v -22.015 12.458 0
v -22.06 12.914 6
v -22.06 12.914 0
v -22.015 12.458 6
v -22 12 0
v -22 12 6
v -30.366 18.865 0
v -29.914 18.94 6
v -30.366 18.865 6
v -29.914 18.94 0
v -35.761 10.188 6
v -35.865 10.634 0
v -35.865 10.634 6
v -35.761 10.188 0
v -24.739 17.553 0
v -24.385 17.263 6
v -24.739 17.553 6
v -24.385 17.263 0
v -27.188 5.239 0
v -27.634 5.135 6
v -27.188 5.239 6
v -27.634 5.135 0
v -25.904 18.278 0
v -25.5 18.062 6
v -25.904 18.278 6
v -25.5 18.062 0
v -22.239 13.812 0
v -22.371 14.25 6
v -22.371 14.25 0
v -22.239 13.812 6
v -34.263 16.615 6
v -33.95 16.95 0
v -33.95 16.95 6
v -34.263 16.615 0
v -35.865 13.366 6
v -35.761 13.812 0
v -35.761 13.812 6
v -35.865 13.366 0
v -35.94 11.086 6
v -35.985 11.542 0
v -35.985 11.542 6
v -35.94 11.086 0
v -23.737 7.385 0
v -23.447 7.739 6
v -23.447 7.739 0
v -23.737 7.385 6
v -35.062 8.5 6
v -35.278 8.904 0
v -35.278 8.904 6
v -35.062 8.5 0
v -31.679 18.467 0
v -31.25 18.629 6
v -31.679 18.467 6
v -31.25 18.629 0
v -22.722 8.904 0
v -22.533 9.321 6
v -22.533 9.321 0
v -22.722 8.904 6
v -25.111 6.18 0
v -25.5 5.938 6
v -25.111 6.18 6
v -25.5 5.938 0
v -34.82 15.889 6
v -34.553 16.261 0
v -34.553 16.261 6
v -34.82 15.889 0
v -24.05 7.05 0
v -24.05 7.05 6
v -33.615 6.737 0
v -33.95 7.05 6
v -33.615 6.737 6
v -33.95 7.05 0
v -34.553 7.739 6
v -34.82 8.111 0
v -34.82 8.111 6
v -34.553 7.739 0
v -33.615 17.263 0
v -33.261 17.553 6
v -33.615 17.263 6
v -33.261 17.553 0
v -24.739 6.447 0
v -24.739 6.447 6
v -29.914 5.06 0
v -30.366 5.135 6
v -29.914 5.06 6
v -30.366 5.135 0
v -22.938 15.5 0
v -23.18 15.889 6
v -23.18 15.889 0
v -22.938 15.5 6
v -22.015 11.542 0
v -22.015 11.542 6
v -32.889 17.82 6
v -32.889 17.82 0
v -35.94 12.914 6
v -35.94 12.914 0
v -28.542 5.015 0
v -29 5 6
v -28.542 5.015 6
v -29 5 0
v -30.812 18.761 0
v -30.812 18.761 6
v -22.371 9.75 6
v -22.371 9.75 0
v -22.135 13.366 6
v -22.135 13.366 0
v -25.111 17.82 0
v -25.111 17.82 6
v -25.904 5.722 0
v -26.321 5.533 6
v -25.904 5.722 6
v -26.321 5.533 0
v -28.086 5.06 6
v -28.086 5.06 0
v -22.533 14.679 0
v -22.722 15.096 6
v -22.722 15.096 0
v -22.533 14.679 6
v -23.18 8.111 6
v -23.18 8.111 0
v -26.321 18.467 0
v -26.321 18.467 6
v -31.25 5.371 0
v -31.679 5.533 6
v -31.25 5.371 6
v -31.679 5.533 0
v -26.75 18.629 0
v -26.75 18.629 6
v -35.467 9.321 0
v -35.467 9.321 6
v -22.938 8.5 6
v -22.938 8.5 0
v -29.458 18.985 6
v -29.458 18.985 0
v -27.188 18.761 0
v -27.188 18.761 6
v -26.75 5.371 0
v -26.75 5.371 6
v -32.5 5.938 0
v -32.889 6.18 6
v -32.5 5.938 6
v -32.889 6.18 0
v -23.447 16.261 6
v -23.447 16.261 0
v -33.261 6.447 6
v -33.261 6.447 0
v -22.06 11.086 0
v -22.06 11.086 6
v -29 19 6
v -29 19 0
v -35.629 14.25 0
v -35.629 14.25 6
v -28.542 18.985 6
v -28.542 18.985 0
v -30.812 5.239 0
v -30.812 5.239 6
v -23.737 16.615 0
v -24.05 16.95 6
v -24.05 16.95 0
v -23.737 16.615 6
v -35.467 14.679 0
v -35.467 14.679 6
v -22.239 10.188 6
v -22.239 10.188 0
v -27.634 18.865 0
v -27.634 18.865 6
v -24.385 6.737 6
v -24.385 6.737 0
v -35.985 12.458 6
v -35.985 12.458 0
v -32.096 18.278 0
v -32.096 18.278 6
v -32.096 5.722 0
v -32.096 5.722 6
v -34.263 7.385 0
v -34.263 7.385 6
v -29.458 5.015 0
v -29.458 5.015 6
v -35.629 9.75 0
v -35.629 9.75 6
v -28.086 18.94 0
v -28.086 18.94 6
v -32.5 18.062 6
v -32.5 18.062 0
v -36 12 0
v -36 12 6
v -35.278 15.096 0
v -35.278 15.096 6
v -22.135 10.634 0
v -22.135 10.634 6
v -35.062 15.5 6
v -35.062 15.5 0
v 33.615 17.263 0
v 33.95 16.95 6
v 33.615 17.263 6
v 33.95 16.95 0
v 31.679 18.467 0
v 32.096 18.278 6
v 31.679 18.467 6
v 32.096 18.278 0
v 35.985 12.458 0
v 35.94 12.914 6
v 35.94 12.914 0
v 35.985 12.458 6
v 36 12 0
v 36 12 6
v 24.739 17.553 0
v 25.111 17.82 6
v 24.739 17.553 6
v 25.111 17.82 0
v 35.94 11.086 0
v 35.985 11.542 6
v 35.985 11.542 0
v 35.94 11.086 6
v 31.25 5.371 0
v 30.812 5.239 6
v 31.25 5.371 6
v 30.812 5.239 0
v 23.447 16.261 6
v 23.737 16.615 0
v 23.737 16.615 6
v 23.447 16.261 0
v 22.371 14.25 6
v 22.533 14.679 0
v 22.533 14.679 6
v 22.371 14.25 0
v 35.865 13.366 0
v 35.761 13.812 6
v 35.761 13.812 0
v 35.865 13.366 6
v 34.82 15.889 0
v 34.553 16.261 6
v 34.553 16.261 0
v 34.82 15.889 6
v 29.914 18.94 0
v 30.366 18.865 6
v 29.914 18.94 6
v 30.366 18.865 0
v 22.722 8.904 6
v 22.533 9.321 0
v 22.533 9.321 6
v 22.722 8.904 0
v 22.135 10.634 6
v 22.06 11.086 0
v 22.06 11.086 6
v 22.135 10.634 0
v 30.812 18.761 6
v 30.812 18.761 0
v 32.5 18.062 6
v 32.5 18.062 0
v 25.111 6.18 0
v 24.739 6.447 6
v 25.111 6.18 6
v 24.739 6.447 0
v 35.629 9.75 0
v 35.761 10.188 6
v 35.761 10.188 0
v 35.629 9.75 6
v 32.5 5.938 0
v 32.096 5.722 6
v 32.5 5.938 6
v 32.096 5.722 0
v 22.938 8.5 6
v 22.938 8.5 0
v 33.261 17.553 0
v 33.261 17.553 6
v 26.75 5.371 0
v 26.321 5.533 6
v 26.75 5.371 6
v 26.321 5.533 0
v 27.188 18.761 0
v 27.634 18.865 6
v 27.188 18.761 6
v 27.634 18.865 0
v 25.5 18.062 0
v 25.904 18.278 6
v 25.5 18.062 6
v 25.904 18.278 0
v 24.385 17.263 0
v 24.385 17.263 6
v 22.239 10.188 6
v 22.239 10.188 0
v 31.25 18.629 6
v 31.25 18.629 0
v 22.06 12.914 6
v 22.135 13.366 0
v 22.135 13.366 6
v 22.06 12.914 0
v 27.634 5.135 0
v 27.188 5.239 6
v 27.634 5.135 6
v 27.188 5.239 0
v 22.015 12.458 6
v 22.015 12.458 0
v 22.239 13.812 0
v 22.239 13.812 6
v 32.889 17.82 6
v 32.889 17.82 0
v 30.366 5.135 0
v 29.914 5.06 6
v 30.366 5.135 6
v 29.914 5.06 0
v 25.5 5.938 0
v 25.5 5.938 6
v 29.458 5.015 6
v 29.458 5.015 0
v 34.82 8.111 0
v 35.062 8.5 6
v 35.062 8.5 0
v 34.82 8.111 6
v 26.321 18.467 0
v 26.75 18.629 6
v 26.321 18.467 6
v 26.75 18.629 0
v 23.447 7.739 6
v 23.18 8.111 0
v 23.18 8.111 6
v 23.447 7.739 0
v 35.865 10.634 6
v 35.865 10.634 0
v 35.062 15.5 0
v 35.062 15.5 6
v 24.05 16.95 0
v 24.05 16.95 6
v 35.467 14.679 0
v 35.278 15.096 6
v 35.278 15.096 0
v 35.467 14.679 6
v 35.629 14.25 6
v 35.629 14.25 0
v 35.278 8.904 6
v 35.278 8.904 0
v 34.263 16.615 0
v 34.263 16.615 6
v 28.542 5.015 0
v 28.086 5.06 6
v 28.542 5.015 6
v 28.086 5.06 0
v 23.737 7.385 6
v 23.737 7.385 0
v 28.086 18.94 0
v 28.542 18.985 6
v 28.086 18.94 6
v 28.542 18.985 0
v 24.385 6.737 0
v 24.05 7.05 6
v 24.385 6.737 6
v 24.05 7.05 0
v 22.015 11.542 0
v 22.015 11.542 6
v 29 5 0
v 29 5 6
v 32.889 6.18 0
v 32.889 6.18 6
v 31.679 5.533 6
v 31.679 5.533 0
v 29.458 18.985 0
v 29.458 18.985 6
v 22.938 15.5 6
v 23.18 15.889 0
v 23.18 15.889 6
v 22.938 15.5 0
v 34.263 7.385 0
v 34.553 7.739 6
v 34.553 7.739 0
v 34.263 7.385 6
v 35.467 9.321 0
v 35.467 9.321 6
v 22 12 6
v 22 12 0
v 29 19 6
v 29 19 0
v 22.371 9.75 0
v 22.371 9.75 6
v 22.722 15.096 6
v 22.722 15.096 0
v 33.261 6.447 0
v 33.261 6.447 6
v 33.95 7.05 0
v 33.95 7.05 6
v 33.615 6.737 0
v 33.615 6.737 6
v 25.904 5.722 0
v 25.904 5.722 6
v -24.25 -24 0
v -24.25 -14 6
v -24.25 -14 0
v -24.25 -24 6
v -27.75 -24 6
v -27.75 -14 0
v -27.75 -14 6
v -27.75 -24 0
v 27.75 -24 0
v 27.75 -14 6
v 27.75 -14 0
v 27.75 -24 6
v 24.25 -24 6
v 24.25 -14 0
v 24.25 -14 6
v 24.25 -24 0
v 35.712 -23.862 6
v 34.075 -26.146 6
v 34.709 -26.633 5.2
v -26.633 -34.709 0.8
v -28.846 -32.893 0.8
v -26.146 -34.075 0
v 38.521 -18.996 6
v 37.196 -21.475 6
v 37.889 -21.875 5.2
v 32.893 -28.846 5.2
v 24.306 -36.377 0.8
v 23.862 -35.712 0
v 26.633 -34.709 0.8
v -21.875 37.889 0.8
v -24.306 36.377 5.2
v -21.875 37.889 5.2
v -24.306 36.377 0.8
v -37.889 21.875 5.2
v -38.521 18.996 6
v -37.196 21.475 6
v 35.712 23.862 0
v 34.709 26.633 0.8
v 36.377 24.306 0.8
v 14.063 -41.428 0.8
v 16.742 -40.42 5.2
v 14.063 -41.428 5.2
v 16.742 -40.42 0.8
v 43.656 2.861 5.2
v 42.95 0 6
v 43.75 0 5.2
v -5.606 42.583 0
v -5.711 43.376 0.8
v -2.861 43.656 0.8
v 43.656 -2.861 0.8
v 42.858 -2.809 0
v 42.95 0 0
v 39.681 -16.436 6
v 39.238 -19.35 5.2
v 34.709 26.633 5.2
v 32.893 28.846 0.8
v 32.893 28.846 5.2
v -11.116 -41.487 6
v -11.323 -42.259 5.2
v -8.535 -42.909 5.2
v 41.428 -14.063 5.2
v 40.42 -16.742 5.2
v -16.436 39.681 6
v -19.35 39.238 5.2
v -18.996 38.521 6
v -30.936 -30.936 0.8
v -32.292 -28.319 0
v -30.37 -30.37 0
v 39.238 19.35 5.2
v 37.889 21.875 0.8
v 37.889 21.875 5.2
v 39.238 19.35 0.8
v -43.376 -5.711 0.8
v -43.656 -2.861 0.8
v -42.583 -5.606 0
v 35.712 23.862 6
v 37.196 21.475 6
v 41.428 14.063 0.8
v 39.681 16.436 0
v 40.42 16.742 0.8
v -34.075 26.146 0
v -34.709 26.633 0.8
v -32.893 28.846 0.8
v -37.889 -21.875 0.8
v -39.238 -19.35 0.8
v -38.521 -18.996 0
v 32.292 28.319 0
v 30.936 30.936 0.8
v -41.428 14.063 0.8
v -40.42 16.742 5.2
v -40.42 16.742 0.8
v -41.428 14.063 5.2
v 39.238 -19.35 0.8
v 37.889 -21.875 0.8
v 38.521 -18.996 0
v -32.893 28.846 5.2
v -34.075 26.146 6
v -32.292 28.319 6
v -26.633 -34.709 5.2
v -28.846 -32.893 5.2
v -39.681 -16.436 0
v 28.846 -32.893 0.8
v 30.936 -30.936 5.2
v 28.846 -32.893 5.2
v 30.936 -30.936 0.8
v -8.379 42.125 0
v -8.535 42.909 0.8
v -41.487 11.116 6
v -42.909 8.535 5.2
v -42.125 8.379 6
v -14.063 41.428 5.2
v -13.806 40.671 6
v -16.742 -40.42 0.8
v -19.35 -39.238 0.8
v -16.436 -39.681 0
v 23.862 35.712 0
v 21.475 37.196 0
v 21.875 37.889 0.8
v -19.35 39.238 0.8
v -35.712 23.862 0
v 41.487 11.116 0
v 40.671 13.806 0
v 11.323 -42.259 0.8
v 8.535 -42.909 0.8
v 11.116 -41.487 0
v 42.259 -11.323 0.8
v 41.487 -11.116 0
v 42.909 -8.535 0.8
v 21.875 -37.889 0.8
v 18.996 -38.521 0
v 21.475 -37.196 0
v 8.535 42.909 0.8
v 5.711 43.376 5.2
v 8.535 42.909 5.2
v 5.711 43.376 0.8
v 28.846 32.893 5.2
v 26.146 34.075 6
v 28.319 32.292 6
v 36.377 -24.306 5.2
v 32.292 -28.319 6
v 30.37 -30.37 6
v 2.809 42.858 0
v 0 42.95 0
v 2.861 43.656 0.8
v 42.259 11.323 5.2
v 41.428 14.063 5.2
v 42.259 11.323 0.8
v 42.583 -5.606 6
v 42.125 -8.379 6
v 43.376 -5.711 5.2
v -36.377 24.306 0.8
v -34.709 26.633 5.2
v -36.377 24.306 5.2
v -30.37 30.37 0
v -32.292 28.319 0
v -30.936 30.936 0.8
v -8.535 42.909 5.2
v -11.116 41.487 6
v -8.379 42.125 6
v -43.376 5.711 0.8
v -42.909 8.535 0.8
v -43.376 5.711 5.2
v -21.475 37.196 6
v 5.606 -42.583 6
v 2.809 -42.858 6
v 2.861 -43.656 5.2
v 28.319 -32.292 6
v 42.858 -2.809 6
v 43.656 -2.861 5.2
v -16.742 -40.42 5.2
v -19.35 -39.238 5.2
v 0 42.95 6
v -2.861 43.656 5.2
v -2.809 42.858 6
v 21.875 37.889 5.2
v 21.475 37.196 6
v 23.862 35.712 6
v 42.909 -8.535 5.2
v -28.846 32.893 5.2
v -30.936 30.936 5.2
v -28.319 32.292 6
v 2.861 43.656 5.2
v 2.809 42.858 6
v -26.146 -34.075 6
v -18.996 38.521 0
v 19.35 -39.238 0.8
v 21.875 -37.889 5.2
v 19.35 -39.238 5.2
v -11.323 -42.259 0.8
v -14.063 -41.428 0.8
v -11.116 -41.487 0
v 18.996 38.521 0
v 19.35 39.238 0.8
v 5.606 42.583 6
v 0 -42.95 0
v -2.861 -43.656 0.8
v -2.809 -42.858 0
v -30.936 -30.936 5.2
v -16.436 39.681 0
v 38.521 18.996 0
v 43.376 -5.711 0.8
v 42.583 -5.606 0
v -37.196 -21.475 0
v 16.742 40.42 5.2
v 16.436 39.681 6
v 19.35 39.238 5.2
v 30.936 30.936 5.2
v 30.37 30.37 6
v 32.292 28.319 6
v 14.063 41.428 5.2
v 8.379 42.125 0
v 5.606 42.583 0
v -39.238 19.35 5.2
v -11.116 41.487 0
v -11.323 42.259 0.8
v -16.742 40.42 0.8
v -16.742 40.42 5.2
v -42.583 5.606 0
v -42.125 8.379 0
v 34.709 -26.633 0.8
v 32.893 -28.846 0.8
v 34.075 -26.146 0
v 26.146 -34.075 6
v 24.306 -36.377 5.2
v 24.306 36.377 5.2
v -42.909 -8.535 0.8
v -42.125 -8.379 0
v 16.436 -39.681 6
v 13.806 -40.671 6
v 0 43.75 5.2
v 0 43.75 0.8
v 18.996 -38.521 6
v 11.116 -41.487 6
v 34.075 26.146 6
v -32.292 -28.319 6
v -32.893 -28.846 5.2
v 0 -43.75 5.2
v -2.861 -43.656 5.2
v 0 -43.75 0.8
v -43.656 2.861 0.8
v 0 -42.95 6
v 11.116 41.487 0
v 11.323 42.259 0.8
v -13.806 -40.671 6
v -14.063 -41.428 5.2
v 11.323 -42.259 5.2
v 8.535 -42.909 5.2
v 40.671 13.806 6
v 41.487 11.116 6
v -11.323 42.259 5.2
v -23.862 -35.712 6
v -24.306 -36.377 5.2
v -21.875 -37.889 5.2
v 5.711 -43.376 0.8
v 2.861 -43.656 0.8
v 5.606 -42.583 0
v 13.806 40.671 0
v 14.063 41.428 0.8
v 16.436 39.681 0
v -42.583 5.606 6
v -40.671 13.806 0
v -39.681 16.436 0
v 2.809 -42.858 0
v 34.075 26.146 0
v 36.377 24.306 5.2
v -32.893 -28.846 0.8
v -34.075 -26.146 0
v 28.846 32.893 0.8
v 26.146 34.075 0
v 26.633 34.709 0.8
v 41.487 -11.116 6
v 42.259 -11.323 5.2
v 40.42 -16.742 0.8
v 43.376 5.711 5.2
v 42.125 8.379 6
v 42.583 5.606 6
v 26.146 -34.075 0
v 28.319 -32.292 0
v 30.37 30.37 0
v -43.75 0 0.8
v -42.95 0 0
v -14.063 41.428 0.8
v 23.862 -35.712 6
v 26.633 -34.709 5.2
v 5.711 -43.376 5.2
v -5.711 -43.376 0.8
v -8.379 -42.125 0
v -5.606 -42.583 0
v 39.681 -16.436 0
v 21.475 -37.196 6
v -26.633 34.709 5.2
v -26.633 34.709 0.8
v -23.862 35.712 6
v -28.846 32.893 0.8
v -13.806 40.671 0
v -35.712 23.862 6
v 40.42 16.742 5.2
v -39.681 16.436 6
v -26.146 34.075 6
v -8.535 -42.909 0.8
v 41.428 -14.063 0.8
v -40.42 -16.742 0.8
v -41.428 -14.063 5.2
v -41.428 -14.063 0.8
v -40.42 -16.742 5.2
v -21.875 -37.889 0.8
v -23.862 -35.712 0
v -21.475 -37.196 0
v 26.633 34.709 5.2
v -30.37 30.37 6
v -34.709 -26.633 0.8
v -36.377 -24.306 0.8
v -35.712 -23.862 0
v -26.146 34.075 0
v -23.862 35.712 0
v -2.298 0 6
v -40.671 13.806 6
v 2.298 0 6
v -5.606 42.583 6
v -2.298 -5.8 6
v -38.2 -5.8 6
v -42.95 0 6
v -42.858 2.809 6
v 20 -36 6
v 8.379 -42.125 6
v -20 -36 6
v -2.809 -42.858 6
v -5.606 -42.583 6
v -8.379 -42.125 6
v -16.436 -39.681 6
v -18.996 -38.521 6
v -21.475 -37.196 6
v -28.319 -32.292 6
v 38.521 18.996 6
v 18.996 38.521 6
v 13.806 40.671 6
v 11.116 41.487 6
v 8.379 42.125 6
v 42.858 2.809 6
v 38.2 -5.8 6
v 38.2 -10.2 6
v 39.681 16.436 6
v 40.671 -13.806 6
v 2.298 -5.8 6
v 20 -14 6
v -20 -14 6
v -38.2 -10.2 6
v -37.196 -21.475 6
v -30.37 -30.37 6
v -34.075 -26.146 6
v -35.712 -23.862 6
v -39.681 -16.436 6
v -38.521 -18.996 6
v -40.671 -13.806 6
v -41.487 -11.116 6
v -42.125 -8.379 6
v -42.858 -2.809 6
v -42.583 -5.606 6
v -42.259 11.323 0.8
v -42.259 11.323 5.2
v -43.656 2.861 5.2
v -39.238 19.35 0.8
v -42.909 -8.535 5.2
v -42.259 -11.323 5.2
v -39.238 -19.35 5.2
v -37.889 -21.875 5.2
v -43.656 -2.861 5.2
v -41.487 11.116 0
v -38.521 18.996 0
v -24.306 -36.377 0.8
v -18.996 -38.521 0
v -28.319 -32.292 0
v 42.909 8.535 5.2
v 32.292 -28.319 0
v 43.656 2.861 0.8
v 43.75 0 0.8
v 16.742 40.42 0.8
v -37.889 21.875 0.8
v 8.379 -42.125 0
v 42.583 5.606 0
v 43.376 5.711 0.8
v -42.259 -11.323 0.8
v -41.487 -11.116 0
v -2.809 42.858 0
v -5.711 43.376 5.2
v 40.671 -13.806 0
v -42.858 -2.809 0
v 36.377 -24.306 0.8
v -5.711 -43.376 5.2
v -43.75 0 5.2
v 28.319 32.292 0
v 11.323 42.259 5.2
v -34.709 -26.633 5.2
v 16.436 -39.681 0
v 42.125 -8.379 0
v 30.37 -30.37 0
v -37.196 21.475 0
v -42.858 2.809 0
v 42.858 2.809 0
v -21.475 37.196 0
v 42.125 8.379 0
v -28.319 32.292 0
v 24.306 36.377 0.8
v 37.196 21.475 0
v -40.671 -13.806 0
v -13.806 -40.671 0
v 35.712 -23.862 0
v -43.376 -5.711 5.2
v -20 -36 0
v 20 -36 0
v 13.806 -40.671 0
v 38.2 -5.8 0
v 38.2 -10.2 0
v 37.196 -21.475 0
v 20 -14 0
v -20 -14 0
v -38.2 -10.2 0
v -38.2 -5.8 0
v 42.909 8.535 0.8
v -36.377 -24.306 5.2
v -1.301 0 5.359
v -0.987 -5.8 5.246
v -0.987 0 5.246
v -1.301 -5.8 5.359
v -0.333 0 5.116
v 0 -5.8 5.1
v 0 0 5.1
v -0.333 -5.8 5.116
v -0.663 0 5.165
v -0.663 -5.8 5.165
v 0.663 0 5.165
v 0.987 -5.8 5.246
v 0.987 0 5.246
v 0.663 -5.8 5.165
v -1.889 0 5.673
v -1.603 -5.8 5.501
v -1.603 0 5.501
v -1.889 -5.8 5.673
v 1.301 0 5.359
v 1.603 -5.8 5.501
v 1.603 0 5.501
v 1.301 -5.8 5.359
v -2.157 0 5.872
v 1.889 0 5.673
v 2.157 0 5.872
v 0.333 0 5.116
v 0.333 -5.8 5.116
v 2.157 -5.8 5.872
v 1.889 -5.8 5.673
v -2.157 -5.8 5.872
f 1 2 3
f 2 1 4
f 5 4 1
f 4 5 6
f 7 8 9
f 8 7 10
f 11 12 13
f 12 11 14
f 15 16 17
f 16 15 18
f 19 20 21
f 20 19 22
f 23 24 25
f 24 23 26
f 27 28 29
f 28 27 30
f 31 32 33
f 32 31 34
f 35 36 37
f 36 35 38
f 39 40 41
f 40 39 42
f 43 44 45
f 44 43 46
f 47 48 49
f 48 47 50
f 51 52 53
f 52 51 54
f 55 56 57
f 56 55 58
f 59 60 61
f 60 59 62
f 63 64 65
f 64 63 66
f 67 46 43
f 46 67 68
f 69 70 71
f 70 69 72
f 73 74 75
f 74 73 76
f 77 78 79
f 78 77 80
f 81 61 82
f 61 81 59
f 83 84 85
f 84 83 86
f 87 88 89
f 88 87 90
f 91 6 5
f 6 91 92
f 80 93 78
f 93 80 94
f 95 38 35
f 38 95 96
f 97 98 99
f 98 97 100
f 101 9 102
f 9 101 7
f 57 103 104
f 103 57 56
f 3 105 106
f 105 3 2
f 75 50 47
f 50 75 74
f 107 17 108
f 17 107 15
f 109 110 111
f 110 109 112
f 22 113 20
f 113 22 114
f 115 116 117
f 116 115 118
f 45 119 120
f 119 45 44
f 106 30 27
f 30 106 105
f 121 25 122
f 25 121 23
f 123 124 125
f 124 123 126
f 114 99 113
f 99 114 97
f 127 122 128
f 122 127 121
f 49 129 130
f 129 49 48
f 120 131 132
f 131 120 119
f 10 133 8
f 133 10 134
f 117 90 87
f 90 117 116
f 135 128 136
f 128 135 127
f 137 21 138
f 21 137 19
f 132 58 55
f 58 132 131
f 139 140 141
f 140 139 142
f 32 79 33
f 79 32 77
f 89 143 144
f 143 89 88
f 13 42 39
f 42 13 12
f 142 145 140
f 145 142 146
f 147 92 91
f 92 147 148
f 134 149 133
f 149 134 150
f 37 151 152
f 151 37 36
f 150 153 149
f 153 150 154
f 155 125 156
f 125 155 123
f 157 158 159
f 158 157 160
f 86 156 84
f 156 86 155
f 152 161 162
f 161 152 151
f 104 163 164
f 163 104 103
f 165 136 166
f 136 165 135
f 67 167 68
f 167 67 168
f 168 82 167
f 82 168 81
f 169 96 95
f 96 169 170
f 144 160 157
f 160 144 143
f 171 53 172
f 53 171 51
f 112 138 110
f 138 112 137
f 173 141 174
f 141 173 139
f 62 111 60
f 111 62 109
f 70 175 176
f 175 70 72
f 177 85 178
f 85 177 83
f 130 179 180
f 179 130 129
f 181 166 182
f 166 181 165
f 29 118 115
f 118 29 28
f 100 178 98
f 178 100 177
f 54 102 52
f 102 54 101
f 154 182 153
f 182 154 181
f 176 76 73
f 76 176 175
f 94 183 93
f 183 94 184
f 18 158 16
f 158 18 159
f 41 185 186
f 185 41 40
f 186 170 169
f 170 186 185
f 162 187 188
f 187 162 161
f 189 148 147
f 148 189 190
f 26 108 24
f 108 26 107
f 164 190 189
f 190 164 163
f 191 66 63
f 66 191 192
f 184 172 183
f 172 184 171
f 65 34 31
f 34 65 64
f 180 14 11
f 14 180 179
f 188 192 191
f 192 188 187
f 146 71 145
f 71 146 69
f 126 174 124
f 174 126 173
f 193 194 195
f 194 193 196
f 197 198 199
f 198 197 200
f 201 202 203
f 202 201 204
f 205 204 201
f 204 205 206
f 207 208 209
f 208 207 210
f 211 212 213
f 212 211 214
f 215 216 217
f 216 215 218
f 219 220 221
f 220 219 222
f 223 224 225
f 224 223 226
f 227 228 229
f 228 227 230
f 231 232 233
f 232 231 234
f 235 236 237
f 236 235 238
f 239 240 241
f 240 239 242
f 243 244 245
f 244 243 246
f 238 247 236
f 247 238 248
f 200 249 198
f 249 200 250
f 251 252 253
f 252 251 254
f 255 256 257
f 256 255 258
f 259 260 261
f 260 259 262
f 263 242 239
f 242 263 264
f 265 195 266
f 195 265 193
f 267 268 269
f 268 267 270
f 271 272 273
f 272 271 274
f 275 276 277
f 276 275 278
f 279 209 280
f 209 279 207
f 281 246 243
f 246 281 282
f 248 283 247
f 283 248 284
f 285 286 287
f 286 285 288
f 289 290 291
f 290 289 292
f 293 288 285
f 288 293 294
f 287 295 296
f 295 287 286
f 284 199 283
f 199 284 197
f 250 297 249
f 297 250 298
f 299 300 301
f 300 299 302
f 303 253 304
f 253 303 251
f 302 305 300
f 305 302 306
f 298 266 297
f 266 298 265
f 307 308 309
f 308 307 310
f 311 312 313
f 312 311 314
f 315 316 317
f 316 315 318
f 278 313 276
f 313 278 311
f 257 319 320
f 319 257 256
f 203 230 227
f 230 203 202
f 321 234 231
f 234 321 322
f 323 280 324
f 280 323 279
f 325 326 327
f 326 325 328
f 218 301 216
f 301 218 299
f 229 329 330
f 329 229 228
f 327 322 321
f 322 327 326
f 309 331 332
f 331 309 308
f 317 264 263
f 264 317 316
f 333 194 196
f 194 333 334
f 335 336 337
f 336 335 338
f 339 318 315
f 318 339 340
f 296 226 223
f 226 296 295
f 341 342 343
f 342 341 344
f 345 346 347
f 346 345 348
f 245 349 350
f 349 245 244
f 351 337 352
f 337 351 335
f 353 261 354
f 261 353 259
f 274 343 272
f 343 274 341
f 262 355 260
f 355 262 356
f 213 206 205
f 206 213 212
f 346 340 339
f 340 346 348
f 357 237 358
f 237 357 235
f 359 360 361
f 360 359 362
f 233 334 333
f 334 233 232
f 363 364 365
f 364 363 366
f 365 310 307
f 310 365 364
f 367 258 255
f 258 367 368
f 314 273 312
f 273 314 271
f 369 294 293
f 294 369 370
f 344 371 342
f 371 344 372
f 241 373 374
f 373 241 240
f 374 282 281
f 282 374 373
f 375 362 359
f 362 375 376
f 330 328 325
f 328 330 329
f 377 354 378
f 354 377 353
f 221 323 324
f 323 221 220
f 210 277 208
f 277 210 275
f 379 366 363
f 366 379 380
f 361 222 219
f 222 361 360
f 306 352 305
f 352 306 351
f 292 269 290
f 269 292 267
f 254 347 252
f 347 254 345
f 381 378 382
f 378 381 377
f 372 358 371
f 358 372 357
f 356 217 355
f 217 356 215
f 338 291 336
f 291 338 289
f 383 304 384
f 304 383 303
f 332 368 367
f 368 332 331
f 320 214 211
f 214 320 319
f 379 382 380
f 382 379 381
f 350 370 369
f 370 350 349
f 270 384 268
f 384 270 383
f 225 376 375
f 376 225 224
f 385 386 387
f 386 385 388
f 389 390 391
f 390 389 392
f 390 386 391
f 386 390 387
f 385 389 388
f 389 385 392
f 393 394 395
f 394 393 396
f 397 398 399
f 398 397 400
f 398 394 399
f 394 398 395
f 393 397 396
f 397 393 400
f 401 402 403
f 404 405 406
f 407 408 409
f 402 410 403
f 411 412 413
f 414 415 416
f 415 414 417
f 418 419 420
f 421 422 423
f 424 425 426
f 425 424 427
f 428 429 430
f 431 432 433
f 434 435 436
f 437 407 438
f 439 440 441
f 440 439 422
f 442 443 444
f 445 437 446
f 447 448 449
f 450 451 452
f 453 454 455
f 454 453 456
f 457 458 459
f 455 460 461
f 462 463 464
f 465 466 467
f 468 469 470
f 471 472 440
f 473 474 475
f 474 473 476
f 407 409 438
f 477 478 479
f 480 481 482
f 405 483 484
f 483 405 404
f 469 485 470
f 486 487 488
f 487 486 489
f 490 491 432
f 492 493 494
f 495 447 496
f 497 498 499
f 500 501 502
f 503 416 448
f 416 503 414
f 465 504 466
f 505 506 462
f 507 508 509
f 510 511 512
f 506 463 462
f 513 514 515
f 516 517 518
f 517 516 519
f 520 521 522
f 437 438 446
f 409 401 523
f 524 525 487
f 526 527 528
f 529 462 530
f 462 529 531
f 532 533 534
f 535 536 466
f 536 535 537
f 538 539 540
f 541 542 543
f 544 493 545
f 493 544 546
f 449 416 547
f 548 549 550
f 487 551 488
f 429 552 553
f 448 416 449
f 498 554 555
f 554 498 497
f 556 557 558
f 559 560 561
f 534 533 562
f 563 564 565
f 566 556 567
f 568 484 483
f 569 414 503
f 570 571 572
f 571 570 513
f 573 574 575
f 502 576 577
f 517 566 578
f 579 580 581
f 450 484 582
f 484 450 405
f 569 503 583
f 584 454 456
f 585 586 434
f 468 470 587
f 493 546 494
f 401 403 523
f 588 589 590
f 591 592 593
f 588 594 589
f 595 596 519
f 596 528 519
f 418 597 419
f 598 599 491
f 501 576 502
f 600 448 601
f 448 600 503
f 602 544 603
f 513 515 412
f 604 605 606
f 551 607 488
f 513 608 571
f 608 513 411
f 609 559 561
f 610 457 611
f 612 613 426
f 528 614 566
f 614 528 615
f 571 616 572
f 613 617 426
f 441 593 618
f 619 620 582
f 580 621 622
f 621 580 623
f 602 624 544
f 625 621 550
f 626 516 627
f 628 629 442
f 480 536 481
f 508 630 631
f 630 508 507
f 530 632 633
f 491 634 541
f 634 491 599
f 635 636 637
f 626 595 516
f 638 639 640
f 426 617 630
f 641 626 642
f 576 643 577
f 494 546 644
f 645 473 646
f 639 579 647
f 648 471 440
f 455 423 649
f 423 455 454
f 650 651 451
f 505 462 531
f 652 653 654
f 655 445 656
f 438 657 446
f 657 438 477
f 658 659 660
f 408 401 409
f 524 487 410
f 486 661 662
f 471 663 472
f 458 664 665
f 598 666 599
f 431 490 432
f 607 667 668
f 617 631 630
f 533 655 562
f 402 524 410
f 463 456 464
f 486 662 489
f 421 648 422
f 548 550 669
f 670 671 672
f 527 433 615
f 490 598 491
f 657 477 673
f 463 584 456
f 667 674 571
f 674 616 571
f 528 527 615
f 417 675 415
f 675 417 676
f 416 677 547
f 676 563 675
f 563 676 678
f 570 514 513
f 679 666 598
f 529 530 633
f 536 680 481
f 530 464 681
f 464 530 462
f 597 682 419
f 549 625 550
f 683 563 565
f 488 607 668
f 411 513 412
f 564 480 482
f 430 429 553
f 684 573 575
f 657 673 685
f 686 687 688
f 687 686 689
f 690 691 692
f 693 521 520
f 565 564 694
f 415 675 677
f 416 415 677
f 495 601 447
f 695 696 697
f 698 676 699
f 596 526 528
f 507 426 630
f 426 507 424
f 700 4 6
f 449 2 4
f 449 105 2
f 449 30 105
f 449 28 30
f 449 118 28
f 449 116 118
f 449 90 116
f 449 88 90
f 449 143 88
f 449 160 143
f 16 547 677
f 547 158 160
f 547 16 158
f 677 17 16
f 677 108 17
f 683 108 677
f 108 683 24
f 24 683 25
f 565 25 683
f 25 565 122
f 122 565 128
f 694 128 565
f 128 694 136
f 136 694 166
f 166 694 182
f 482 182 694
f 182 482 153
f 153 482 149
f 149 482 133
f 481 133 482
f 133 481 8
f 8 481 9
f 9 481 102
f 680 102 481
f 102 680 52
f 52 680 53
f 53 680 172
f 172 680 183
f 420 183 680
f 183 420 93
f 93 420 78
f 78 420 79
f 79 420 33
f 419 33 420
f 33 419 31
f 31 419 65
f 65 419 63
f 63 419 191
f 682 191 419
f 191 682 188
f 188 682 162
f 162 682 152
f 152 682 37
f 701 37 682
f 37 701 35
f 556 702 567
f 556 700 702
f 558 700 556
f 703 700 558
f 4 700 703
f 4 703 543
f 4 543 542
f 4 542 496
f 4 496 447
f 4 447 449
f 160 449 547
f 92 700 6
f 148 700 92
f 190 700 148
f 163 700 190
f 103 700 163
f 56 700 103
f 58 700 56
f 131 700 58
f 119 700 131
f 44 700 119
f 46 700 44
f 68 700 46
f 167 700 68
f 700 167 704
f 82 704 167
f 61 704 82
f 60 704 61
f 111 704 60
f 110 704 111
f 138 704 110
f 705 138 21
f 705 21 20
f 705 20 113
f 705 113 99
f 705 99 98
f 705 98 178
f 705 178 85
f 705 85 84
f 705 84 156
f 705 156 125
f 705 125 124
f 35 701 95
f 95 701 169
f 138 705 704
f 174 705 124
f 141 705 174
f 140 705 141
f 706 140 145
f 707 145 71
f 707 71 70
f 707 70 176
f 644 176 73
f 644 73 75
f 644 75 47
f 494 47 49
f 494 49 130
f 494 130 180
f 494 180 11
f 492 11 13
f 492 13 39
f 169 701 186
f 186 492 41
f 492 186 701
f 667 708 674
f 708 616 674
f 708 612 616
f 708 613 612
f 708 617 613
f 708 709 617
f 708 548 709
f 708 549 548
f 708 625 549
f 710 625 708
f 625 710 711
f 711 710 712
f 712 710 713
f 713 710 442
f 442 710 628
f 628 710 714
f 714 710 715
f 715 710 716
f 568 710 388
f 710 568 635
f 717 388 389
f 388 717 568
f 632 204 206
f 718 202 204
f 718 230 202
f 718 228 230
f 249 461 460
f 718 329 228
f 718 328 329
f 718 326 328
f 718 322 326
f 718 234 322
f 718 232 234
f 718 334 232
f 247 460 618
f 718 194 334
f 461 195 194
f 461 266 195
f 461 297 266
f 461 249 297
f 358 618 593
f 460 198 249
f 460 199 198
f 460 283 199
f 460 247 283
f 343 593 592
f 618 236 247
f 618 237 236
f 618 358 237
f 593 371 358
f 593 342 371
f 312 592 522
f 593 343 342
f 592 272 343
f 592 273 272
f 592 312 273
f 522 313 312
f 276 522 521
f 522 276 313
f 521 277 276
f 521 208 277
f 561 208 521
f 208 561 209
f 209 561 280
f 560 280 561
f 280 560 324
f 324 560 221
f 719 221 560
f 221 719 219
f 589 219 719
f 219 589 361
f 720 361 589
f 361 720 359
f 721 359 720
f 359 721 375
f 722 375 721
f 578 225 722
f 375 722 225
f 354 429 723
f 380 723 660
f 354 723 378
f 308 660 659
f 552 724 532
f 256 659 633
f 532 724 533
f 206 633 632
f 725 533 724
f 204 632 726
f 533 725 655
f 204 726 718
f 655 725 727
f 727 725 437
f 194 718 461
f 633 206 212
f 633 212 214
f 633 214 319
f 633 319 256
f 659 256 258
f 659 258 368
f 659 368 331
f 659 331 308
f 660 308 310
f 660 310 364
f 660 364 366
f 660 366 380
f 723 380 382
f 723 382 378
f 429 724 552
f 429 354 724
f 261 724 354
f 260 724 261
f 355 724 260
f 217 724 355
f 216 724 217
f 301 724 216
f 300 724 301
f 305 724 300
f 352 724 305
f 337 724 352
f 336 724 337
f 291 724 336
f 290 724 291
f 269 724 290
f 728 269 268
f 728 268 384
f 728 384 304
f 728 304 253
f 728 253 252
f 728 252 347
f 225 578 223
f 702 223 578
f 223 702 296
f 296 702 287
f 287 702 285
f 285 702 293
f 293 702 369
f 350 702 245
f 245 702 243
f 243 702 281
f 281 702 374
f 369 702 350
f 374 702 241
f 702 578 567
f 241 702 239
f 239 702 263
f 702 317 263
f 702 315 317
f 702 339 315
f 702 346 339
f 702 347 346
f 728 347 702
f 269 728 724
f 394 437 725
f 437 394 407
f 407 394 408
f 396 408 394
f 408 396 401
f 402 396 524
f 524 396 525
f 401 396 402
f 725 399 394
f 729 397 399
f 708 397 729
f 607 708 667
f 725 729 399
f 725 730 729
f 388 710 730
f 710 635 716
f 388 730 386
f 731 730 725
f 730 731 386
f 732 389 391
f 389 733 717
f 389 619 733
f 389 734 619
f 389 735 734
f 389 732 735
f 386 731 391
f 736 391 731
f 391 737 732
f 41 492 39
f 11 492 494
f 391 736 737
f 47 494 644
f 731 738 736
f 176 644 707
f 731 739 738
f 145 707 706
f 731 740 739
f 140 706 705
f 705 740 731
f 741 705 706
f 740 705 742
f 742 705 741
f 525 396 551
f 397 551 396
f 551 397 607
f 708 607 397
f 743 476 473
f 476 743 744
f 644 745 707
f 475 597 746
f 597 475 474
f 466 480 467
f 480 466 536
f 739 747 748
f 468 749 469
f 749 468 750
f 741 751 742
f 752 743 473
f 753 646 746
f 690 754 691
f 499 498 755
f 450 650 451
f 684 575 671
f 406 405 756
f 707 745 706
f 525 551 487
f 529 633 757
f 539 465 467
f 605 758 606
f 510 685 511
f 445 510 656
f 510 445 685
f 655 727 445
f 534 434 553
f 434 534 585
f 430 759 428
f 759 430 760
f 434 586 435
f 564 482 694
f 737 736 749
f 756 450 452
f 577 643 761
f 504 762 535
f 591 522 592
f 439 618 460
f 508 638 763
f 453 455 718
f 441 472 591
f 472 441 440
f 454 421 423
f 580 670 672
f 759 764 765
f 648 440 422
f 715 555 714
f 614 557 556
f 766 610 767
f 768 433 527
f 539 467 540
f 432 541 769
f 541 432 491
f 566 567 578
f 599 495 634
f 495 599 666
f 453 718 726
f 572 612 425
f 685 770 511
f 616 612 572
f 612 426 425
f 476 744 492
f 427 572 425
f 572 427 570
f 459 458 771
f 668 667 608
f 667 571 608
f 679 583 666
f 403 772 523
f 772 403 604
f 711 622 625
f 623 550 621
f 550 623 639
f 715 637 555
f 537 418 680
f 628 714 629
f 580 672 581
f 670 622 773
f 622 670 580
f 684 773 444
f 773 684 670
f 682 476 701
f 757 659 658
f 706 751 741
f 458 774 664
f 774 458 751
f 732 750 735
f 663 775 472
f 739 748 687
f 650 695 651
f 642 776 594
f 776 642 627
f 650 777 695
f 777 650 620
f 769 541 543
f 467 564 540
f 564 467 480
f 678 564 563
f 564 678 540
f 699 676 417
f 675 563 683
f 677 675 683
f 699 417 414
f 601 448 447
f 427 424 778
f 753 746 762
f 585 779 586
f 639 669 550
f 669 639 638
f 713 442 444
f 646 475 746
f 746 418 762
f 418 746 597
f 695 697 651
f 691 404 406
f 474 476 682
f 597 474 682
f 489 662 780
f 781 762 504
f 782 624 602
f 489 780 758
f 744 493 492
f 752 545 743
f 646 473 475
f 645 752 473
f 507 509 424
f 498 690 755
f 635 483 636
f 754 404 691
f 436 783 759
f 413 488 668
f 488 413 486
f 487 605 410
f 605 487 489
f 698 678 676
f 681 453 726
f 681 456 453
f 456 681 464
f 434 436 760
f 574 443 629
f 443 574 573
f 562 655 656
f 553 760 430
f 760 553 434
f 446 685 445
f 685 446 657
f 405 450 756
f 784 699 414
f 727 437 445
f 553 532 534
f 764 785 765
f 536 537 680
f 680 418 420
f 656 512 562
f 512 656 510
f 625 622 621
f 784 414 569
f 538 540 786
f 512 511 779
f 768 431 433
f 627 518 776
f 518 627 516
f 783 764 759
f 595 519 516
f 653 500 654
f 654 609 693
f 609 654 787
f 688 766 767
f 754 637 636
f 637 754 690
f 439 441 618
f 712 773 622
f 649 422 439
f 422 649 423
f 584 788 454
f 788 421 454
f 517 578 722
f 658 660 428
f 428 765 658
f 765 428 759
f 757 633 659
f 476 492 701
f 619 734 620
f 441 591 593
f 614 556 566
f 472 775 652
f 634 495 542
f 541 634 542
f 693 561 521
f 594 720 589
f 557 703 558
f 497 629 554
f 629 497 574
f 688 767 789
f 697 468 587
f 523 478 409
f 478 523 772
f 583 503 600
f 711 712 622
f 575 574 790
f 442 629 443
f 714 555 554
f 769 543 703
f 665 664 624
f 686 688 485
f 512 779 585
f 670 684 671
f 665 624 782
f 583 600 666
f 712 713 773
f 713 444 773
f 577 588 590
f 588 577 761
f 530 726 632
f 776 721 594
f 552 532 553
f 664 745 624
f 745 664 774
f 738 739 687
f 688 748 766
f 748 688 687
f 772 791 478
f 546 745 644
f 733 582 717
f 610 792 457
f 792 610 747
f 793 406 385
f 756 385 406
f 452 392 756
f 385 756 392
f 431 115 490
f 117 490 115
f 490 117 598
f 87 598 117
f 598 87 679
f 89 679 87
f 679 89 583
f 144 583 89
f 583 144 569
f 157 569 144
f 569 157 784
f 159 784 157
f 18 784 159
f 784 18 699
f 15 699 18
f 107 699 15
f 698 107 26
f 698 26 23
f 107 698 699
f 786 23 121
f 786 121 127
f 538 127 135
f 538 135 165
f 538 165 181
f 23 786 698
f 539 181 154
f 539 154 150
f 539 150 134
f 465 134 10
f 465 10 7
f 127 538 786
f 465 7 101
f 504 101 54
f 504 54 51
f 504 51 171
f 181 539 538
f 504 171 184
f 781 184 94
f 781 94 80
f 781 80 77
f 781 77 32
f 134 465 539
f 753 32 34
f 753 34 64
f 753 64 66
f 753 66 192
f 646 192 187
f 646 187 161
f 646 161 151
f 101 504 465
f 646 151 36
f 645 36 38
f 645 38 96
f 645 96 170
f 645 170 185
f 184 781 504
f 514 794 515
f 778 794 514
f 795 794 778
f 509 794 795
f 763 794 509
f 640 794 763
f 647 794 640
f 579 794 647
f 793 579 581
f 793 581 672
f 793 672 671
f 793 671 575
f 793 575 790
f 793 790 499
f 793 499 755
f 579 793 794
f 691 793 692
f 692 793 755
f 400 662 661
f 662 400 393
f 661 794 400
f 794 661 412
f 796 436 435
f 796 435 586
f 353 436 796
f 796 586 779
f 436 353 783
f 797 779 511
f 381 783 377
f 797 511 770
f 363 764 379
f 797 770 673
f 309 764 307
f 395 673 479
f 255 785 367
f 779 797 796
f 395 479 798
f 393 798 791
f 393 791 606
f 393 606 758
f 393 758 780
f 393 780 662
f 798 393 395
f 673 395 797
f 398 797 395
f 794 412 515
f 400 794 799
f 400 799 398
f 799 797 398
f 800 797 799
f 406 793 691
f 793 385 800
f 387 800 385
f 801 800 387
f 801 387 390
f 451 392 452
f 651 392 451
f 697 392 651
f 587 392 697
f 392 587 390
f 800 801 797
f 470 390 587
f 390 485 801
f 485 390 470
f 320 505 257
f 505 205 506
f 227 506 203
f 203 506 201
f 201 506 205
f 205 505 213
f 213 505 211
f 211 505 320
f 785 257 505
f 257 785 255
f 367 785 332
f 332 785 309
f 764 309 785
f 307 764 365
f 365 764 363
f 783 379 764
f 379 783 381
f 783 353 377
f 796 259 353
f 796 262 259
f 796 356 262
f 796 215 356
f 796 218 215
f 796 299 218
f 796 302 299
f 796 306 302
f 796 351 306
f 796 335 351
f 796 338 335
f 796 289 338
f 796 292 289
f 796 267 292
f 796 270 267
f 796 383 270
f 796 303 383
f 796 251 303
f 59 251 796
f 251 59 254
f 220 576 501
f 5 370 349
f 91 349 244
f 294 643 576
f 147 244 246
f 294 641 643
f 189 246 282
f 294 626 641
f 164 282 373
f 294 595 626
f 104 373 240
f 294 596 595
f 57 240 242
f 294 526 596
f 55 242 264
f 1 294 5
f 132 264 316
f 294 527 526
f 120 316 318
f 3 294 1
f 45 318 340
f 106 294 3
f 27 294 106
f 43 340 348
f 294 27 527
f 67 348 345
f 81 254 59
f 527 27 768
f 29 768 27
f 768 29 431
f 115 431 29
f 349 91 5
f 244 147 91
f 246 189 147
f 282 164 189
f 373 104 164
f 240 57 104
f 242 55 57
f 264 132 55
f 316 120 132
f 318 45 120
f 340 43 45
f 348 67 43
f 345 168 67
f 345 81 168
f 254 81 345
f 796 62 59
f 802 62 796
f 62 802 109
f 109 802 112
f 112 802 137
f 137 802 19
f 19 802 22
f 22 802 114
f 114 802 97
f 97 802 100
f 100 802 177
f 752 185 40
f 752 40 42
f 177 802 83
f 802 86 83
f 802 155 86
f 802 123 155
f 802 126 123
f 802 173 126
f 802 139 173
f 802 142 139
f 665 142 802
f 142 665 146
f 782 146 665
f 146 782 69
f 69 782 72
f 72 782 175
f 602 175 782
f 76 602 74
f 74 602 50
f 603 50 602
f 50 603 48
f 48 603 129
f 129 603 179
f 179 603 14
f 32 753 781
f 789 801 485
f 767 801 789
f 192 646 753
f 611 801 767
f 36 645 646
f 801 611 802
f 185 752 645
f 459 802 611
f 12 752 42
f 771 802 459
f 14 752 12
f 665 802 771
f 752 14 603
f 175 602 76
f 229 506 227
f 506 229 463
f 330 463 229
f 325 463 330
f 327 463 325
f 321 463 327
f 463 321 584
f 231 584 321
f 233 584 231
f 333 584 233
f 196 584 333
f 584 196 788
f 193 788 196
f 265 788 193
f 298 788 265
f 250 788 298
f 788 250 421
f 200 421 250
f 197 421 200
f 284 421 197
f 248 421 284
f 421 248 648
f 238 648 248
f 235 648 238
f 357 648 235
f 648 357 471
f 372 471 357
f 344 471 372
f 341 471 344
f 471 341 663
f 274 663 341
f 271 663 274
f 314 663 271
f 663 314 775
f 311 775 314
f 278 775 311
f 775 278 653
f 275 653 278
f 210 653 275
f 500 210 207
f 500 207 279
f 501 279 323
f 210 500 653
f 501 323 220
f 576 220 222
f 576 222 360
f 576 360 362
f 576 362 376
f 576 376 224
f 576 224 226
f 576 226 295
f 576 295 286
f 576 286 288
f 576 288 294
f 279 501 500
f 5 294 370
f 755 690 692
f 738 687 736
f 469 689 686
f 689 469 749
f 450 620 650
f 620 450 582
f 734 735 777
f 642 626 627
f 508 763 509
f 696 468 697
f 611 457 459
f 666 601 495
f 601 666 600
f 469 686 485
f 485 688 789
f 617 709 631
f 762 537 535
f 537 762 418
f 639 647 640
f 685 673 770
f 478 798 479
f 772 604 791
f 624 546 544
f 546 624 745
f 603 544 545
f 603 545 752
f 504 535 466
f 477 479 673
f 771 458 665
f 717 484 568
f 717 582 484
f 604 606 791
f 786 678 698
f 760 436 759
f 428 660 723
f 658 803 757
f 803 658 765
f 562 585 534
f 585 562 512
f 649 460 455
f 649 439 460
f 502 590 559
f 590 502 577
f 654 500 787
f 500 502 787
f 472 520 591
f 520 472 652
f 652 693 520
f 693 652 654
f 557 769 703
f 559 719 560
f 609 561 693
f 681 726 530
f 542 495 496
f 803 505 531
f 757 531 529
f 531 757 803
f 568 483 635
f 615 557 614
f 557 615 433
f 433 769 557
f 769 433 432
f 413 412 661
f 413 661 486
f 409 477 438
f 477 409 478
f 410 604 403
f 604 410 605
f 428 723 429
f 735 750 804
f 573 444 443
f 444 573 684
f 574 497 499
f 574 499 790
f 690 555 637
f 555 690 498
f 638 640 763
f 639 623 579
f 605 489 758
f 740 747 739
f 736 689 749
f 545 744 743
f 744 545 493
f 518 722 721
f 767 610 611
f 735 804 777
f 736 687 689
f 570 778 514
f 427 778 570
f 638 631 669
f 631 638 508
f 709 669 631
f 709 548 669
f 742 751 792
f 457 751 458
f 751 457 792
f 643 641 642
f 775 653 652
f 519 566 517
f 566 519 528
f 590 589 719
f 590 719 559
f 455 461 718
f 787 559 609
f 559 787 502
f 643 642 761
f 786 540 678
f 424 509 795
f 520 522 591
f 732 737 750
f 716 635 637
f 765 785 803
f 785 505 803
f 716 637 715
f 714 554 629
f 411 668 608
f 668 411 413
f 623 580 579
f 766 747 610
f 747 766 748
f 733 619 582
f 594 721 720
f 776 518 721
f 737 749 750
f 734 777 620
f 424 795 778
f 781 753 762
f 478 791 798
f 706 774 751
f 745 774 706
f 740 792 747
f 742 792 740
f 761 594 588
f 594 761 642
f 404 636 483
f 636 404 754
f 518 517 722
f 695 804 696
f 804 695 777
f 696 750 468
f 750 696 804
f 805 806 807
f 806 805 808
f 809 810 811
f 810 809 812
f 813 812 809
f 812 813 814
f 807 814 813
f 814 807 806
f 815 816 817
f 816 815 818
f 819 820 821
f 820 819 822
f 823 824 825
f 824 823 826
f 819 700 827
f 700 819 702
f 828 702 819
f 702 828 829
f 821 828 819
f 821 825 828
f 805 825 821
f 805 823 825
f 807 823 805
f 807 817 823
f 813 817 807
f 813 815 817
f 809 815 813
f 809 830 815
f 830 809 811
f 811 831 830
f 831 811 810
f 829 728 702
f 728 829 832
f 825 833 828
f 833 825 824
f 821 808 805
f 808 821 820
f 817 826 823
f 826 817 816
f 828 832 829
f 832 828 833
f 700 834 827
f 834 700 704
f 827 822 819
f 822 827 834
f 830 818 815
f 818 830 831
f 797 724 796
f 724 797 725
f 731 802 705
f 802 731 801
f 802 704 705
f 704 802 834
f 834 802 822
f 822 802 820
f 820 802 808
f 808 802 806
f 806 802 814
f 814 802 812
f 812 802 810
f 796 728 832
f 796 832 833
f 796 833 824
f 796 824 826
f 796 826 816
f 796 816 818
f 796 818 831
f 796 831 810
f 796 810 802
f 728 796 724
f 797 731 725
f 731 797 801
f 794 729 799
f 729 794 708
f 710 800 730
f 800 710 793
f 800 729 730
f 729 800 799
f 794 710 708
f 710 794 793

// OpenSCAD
// =====================================================================
// child_vtray_rib.scad — 子機 縦置き内装 センタリング バルクヘッド
//
// child_vtray_deck の**両端 (幅 82mm の細い部分)** に挿して、内装を
// フランジ貫通口 (Ø88.5) の中心に保持する。上下 2 枚で内装の姿勢が決まる。
// 固定: ねじ無し。デッキ先端から差し込み、内側ショルダー (幅 84) に当てる。先端側は
// デッキ板を貫く M2.5×6 なべ (頭 Ø4.5) が抜け止め (2026-09-03: 以前は先端側にも
// ショルダーがあり、スロット 76.4 を通らず嵌められなかった)。
//
// 中央下寄りは**ケーブル通路**として大きく開けてある (下キャップの
// ペネトレータから来る全ケーブルがここを通る)。結束バンド用スロット付き。
//
// 座標: child_vtray_deck と同じ (X=幅 / Y=積み方向 / Z=チューブ軸)。
//       原点はリブの Z 始点・軸心。
//
// 印刷向き: 円板を寝かせて (Z を上に) 印刷。全フィーチャ貫通でサポート不要。
// =====================================================================

/* [容器] */
flange_bore = 88.5;   // フランジ貫通口Ø (実測)
bore_clear  = 1.0;    // 径クリアランス

/* [リブ] */
rib_t       = 6;      // 板厚 (Z)
lead_chamfer = 0.8;   // 両面外周45°面取り。挿入時にアクリル縁へ引っ掛けない

/* [デッキとの嵌合 (child_vtray_deck と一致させること)] */
deck_wn     = 76;     // デッキ端部の幅
deck_t      = 4;      // デッキ板厚
deck_y0     = -10;    // デッキ下面 Y
slot_clear  = 0.4;    // 嵌合クリアランス (片側 0.2)
min_web     = 4;      // スロット横に残す最小肉厚

/* [ケーブル通路] */
duct_w      = 40;     // 通路の幅 (X)
duct_y0     = -36;    // 通路の下端 Y
duct_y1     = -14;    // 通路の上端 Y (デッキ下面 -10 の少し下まで)
tie_w       = 3.5;    // 結束バンド スロット 幅
tie_l       = 10;     // 同 長さ (Y)
tie_x       = 26;     // 同 中心 X (±)
tie_y       = -19;    // 同 中心 Y
side_d      = 14;     // 上側の補助通し穴Ø
side_x      = 29;     // 同 中心 X (±)
side_y      = 12;     // 同 中心 Y

$fn = 96;

// ---- 導出 -------------------------------------------------------------
rib_r   = (flange_bore - bore_clear) / 2;      // 43.75
slot_w  = deck_wn + slot_clear;
slot_h  = deck_t  + slot_clear;
slot_y0 = deck_y0 - slot_clear/2;
duct_x  = duct_w/2;

function rad(x, y) = sqrt(x*x + y*y);

// ---- 干渉・成立性チェック ---------------------------------------------
// スロットの角が円板からはみ出さないこと (はみ出すとリブが 2 枚に割れる)
assert(rad(slot_w/2, slot_y0) < rib_r - 1,
       str("嵌合スロットの角が円板の縁に近すぎる r=", rad(slot_w/2, slot_y0),
           " / 半径 ", rib_r));
assert(rad(slot_w/2, slot_y0 + slot_h) < rib_r - 1, "嵌合スロット上側の角が円板の縁に近すぎる");
// スロットの左右に残る肉 (ここでリブの上下がつながっている)
web = rib_r - slot_w/2;
assert(web > min_web,
       str("スロット横の肉 ", web, "mm が薄すぎる (最低 ", min_web, "mm)"));
// ケーブル通路が円板の中に収まること
assert(rad(duct_x, duct_y0) < rib_r - 2,
       str("ケーブル通路の角が円板からはみ出す r=", rad(duct_x, duct_y0)));
assert(duct_y1 < slot_y0, "ケーブル通路がデッキ嵌合スロットに食い込んでいる");
// 結束スロットが通路と円板の間の肉に収まること
assert(tie_x - tie_w/2 > duct_x + 2,
       str("結束スロットがケーブル通路に近すぎる (肉 ", tie_x - tie_w/2 - duct_x, "mm)"));
assert(rad(tie_x + tie_w/2, tie_y - tie_l/2) < rib_r - 2,
       str("結束スロットが円板の縁に近すぎる r=", rad(tie_x + tie_w/2, tie_y - tie_l/2)));
assert(tie_y + tie_l/2 < slot_y0 - 2,
       str("結束スロットがデッキ嵌合スロットに近すぎる (", slot_y0 - (tie_y + tie_l/2), "mm)"));
// 上側の補助通し穴
assert(rad(side_x + side_d/2, side_y) < rib_r - 2,
       str("補助通し穴が円板の縁に近すぎる r=", rad(side_x + side_d/2, side_y)));
assert(side_y - side_d/2 > slot_y0 + slot_h + 2, "補助通し穴が嵌合スロットに食い込んでいる");

// ---- 本体 -------------------------------------------------------------
module glide_disc() {
    hull() {
        cylinder(r=rib_r-lead_chamfer,h=0.01);
        translate([0,0,lead_chamfer])
            cylinder(r=rib_r,h=rib_t-2*lead_chamfer);
        translate([0,0,rib_t-0.01])
            cylinder(r=rib_r-lead_chamfer,h=0.01);
    }
}

difference() {
    glide_disc();
    // M3 upper stop screw: 6.8 mm pan-head/tool clearance, open at top.
    translate([0,deck_y0+deck_t,8.5]) rotate([-90,0,0]) cylinder(d=6.8,h=6,$fn=64);

    // デッキが通るスロット
    translate([-slot_w/2, slot_y0, -0.5]) cube([slot_w, slot_h, rib_t + 1]);

    // ケーブル通路 (下側の大開口)
    translate([-duct_x, duct_y0, -0.5]) cube([duct_w, duct_y1 - duct_y0, rib_t + 1]);

    // 上側の補助通し穴 (基板側へ上げる線)
    for (sx = [-1, 1])
        translate([sx * side_x, side_y, -0.5]) cylinder(d = side_d, h = rib_t + 1);

    // 結束バンド スロット
    for (sx = [-1, 1])
        translate([sx * tie_x - tie_w/2, tie_y - tie_l/2, -0.5])
            cube([tie_w, tie_l, rib_t + 1]);
}

echo(str("child_vtray_rib: Ø", 2*rib_r, " x t", rib_t,
         "  スロット ", slot_w, " x ", slot_h, " @Y", slot_y0,
         "  通路 ", duct_w, " x ", duct_y1 - duct_y0, "  スロット横の肉 ", web));
